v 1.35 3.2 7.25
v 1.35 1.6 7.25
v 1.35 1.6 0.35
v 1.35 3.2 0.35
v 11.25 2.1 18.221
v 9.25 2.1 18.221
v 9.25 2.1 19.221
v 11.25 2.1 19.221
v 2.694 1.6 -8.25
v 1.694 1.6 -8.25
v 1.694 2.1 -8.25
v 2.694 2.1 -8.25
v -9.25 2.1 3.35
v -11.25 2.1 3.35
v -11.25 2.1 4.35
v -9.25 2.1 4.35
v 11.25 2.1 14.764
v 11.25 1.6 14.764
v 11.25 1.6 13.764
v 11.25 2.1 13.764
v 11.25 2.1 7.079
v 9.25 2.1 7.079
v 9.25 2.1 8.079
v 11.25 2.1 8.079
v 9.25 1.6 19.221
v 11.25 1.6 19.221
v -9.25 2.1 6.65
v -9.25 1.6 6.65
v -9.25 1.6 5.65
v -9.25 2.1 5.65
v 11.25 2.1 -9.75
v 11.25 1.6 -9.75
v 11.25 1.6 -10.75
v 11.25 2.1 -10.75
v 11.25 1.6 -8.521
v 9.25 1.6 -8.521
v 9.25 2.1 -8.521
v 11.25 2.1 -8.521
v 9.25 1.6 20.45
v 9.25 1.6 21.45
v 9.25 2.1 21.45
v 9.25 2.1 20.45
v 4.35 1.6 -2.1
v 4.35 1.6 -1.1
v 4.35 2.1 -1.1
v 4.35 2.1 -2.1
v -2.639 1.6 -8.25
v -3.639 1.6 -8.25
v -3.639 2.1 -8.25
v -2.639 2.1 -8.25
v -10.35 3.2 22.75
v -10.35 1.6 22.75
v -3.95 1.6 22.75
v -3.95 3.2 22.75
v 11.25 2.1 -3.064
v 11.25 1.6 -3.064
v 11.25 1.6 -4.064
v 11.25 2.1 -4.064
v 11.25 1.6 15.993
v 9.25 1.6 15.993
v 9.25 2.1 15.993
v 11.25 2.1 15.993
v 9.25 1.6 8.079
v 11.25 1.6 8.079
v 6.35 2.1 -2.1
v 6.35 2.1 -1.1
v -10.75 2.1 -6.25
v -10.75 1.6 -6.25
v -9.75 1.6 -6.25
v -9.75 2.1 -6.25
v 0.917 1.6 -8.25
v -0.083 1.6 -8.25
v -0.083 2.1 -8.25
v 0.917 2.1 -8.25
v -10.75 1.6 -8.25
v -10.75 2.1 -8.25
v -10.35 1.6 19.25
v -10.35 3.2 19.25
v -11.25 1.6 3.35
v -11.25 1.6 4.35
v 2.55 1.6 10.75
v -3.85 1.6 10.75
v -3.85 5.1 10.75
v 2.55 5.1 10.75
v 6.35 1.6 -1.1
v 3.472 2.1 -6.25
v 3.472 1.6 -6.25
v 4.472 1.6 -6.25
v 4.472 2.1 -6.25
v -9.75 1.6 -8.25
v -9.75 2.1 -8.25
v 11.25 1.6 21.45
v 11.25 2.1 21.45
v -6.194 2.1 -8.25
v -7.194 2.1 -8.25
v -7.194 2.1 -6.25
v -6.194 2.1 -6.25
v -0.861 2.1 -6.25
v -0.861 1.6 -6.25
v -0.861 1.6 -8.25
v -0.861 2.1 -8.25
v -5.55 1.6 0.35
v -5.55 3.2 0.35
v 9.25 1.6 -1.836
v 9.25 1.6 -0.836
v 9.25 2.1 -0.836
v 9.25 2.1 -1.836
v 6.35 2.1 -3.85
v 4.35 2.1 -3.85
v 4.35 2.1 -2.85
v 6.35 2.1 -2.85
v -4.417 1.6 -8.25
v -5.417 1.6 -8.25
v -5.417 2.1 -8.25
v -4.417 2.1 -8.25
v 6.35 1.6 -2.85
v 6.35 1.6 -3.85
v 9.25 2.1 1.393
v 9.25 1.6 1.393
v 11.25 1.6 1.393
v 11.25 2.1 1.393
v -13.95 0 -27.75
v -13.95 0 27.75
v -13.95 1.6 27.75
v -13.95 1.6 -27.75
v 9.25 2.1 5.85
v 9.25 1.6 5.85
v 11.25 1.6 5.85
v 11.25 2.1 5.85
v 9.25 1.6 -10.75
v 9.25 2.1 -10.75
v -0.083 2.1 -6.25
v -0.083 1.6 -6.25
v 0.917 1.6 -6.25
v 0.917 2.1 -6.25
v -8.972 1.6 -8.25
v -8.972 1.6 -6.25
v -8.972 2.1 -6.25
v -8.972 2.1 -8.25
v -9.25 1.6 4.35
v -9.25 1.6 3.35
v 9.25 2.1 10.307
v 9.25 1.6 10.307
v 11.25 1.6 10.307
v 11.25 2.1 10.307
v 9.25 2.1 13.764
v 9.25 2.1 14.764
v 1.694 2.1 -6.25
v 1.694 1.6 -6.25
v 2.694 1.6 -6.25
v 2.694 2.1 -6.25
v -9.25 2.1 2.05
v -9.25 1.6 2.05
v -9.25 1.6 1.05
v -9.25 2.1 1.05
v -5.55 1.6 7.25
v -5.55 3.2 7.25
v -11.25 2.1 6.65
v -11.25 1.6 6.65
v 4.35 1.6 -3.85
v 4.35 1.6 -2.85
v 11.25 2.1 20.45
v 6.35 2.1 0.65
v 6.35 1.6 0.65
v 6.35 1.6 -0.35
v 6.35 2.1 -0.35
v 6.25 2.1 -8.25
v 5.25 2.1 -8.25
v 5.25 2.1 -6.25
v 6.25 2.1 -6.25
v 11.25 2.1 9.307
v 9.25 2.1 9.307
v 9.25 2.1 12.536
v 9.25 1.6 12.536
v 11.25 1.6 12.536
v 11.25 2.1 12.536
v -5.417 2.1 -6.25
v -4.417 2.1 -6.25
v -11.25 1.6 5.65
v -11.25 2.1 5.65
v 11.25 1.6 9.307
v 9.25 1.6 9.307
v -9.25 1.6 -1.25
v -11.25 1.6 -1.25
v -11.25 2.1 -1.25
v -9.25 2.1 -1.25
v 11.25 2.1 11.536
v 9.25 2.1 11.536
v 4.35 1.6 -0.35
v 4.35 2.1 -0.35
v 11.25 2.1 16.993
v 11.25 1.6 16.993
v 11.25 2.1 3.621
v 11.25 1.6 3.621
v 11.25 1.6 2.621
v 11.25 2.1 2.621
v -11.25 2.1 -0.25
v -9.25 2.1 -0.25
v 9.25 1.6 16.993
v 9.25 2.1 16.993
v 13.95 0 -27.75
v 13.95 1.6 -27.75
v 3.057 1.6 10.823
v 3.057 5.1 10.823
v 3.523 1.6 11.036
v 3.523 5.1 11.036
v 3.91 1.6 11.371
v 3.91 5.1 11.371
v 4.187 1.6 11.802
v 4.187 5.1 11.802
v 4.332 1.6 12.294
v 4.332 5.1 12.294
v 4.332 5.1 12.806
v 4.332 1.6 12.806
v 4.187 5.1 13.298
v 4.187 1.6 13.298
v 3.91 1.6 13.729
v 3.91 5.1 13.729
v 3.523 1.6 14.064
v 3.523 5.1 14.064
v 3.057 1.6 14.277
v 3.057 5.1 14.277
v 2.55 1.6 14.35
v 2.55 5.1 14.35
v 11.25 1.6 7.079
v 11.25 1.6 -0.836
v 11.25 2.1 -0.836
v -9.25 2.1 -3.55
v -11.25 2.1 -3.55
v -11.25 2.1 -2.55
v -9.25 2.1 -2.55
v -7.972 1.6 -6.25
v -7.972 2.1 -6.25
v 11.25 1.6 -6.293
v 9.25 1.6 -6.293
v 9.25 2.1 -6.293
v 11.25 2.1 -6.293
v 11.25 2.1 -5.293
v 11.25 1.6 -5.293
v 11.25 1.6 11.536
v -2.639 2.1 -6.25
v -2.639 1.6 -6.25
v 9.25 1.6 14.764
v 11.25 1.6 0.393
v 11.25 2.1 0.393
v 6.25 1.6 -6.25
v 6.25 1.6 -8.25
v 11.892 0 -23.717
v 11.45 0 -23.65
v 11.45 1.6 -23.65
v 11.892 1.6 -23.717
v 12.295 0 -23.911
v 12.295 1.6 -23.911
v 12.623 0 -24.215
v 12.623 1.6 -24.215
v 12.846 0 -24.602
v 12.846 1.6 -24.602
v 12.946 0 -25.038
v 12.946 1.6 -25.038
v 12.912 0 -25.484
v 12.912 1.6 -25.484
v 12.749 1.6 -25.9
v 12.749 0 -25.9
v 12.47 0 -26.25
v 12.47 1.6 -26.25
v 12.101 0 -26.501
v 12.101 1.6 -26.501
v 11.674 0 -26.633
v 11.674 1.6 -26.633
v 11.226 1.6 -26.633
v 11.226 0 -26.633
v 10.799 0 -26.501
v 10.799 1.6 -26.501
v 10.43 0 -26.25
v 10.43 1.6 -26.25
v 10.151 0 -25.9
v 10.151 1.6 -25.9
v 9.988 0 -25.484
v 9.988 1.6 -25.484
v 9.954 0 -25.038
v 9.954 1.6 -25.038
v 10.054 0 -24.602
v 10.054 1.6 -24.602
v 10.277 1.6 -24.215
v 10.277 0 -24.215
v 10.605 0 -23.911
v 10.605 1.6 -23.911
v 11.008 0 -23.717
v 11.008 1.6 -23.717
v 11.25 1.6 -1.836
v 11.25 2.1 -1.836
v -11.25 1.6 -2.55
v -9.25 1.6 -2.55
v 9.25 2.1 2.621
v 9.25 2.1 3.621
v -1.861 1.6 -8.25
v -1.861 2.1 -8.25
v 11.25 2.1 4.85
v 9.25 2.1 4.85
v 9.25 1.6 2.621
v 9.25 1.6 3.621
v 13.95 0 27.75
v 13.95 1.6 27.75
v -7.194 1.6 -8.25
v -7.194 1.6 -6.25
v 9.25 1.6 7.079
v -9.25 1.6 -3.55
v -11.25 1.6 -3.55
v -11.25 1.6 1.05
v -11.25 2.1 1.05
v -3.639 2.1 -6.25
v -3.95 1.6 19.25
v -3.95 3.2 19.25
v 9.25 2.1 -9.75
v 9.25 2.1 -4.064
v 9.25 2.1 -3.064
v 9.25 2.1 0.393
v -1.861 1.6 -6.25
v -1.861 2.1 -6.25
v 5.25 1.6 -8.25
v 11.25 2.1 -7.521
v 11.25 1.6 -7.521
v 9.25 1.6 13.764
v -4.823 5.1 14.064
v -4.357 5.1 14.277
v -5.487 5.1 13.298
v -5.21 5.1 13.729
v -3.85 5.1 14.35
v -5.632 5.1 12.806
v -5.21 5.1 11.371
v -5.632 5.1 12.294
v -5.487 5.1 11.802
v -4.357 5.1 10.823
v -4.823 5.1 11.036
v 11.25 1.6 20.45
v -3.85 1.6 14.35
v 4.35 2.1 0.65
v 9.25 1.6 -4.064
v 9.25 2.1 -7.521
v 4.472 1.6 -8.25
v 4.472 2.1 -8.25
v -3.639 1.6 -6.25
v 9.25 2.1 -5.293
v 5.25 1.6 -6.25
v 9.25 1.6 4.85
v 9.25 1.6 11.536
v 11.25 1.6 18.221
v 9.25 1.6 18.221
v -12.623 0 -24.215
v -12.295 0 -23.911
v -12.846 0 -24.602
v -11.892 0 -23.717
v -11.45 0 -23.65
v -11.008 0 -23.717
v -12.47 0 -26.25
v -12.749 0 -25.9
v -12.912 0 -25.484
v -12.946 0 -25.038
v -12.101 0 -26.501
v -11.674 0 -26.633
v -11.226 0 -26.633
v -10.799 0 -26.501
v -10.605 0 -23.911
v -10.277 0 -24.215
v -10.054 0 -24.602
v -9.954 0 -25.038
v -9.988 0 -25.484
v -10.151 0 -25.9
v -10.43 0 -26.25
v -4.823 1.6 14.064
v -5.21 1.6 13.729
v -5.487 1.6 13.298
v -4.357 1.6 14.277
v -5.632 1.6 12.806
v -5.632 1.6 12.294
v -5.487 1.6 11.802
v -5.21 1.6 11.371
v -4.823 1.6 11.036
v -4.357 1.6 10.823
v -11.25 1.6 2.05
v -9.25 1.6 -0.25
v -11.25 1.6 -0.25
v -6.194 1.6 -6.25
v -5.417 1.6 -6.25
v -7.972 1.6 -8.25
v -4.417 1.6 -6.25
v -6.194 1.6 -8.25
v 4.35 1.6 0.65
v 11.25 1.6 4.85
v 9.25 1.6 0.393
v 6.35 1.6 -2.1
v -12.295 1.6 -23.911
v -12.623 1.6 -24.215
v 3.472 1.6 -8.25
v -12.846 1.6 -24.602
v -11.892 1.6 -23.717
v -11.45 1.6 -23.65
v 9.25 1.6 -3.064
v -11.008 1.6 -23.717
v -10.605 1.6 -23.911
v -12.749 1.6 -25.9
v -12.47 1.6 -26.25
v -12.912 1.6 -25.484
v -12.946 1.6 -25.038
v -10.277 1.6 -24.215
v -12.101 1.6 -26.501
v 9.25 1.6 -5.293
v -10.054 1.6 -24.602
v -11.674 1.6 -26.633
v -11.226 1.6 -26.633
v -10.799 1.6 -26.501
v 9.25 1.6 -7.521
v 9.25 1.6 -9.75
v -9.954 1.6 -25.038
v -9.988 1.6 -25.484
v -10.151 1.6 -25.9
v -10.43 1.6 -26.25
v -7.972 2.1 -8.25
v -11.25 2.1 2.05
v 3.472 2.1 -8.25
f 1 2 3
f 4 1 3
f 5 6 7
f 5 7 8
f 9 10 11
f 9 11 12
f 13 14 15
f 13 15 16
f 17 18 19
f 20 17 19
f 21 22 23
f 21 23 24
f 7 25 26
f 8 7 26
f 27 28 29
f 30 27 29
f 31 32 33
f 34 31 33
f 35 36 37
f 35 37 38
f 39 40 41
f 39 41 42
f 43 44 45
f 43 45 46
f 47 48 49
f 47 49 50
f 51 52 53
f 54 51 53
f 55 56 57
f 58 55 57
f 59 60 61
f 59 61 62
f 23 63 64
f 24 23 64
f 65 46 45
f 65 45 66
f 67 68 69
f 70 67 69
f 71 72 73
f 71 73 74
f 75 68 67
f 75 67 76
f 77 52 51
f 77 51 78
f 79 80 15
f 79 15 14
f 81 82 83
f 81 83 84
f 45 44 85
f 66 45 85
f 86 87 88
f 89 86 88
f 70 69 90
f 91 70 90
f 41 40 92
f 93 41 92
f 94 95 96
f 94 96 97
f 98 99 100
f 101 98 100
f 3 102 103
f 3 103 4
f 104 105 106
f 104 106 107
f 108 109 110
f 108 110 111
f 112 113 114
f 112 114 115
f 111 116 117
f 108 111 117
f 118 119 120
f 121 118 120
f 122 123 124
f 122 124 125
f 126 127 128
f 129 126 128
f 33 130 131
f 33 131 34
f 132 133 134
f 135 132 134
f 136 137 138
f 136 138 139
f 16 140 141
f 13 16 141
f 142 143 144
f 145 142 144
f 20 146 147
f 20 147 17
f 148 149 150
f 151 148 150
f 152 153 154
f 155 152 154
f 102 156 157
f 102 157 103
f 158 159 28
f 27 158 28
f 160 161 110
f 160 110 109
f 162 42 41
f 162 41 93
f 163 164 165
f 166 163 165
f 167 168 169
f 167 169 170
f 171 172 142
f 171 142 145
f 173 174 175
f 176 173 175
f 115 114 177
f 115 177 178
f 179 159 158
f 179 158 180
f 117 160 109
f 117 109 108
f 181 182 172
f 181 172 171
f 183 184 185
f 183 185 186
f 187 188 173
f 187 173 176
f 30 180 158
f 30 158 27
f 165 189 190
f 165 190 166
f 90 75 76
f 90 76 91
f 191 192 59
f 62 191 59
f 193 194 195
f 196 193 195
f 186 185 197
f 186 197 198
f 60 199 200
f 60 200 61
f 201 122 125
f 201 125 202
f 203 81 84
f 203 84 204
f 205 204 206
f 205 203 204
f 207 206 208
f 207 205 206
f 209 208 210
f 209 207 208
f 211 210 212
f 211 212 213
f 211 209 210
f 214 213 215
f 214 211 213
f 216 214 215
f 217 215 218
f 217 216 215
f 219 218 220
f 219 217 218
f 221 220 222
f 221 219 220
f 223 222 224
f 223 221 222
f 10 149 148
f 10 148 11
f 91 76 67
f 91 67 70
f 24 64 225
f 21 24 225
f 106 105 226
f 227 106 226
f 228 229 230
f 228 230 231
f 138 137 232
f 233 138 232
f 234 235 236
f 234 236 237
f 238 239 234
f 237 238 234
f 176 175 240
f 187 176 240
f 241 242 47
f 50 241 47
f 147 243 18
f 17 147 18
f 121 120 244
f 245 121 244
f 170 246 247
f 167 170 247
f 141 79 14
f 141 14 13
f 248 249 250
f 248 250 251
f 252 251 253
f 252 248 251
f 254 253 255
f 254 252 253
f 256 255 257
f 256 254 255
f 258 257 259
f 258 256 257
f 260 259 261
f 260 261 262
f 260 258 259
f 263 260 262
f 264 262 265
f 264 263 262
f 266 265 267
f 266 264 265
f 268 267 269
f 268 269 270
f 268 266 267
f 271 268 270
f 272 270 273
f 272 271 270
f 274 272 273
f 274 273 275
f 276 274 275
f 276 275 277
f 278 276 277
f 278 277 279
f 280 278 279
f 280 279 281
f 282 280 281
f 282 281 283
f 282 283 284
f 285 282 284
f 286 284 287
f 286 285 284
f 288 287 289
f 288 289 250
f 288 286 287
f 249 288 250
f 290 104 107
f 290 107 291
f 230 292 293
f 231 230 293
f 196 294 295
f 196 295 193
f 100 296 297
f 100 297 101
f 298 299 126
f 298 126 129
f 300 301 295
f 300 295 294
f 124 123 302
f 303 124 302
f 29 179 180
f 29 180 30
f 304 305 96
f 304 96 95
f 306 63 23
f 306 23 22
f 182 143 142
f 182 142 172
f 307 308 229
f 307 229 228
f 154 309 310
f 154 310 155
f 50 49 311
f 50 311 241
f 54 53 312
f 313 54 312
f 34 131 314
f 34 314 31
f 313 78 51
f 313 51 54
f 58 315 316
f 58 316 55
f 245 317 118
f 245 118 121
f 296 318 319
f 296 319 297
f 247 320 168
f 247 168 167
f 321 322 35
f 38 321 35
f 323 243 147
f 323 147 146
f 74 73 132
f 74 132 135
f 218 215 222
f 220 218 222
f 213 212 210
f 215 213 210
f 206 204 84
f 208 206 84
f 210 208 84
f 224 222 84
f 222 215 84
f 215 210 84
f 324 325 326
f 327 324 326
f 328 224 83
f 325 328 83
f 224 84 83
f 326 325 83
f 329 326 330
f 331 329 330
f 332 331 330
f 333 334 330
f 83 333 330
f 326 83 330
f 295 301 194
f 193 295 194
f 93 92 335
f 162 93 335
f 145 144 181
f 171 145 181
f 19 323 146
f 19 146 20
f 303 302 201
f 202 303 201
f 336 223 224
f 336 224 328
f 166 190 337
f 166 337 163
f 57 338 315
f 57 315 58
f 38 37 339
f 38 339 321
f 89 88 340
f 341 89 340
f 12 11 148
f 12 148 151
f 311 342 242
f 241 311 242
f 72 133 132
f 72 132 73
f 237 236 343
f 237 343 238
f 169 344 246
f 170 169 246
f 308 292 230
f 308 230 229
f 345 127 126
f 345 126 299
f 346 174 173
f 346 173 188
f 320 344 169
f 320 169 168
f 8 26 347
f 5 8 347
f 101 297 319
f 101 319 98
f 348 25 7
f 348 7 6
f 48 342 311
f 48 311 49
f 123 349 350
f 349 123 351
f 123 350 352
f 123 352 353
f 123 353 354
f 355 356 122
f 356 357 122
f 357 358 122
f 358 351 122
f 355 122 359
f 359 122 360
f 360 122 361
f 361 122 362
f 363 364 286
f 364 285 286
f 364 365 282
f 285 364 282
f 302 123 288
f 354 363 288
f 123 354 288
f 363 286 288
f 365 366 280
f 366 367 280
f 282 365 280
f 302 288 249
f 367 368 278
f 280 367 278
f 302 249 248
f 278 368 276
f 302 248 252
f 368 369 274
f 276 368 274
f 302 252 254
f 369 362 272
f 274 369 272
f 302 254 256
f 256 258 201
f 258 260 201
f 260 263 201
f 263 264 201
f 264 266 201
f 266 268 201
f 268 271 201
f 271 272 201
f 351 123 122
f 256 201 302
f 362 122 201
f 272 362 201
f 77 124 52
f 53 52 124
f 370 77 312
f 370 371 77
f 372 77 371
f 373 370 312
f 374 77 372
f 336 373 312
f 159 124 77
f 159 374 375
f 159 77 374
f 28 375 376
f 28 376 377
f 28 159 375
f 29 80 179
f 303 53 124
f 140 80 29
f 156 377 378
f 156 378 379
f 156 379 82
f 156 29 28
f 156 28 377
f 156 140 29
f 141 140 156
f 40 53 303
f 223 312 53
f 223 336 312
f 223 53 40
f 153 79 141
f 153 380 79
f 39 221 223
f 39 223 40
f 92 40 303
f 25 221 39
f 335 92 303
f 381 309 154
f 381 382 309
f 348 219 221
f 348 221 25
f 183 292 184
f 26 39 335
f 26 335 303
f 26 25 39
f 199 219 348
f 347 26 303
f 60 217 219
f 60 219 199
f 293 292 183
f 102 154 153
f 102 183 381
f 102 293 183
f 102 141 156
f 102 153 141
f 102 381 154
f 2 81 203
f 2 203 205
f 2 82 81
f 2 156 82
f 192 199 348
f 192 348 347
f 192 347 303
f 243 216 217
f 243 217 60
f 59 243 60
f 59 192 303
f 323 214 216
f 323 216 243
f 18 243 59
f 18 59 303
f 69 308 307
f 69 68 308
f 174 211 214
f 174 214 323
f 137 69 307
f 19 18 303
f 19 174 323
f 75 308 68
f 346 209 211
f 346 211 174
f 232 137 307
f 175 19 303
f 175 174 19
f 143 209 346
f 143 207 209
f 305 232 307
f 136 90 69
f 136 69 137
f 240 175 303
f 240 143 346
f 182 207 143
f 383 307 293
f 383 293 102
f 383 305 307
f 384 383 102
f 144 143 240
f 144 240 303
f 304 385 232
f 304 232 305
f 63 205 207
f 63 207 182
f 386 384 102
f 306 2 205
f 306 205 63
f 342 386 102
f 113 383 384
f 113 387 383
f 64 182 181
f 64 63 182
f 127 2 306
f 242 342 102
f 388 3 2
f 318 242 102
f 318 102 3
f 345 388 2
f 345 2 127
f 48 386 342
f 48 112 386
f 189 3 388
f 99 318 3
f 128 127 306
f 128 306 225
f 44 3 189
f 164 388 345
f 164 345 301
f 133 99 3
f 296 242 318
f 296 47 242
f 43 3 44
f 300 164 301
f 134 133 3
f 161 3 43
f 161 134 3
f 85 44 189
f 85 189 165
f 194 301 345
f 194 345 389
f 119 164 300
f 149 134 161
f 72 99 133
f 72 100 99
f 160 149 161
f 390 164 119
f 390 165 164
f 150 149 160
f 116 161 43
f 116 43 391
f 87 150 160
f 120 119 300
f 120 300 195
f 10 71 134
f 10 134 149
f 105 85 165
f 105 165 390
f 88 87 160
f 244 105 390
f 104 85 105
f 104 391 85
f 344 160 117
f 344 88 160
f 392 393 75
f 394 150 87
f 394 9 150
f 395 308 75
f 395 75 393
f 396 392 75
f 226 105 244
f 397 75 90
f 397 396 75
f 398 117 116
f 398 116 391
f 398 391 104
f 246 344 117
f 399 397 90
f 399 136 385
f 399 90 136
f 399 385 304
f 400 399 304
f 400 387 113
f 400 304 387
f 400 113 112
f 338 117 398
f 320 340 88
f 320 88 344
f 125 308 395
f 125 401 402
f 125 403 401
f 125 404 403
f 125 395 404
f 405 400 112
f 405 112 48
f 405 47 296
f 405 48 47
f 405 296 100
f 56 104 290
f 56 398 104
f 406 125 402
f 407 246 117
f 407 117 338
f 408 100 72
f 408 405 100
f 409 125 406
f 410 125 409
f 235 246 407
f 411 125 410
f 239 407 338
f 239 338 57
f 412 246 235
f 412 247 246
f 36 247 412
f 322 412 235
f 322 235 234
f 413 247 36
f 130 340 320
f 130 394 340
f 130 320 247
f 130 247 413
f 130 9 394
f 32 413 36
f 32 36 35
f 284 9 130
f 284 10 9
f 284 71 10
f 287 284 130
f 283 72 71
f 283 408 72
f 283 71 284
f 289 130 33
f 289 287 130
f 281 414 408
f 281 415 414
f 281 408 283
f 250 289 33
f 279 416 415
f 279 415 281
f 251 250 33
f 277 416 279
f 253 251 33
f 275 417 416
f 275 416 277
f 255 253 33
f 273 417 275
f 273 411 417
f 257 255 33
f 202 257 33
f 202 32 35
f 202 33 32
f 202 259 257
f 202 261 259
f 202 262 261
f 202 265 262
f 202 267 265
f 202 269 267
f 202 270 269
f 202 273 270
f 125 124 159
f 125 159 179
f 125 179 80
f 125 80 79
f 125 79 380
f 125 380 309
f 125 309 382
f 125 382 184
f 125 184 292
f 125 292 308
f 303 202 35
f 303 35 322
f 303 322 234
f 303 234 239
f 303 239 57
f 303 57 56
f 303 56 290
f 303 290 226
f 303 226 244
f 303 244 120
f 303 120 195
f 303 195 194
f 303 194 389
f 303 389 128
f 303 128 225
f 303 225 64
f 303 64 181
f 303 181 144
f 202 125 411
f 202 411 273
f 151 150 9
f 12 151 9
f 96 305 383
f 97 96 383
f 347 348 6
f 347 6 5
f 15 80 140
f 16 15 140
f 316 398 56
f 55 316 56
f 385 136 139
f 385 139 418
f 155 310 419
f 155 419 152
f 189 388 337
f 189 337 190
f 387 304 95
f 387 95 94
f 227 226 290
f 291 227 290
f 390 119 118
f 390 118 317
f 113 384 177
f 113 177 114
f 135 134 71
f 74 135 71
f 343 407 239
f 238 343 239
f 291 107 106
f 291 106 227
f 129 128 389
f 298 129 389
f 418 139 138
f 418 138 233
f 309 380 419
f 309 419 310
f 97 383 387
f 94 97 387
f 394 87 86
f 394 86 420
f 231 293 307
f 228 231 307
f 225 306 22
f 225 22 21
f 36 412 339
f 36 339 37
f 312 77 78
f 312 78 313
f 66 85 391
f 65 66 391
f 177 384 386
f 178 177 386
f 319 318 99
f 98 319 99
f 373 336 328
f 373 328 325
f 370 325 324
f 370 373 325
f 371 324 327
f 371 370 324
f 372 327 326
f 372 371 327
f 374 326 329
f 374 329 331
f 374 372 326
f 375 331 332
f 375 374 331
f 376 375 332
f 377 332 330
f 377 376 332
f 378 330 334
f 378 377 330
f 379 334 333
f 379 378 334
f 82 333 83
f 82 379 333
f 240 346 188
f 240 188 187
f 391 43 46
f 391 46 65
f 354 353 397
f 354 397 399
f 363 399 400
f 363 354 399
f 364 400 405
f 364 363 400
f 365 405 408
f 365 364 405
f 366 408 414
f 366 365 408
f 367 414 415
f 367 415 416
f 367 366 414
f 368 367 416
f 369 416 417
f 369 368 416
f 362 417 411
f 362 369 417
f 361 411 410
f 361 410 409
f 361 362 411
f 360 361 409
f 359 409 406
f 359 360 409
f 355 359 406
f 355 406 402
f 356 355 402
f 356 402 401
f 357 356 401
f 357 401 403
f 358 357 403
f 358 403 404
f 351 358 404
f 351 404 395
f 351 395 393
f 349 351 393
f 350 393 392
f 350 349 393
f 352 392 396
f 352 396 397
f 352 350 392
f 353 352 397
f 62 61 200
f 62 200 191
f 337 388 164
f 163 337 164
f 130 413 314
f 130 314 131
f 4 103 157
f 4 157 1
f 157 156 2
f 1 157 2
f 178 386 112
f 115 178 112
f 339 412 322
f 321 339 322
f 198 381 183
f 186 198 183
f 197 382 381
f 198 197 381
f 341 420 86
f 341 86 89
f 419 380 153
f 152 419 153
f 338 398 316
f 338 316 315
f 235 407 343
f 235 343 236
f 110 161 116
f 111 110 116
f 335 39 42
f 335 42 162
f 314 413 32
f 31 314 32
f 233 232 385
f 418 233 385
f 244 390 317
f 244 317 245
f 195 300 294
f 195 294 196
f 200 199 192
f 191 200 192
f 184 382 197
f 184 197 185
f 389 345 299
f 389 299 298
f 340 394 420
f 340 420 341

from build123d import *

# Parameters (mm, degrees)
SKETCH_1_W      = 27.9
SKETCH_1_H      = 55.5
SKETCH_1_R      = 1.5
EXTRUDE_1_DEPTH = 1.6
SKETCH_2_W      = 6.9
SKETCH_2_H      = 6.9
SKETCH_2_W_2    = 6.4
SKETCH_2_H_2    = 3.5
EXTRUDE_2_DEPTH = 1.6
EXTRUDE_3_DEPTH = 3.5
SKETCH_4_W      = 2
SKETCH_4_H      = 1
SKETCH_4_W_2    = 1
SKETCH_4_H_2    = 2
EXTRUDE_4_DEPTH = 0.5


with BuildPart() as part:
    # Эскиз1 → Бобышка-Вытянуть1 (new body)
    with BuildSketch(Plane(origin=(0, 0, 0), x_dir=(1, 0, 0), z_dir=(0, 1, 0))):
        Rectangle(SKETCH_1_W, SKETCH_1_H)
        with Locations(Location((-11.45, 25.15, 0), (0, 0, 270))):
            Circle(SKETCH_1_R, mode=Mode.SUBTRACT)
        with Locations(Location((11.45, 25.15, 0), (0, 0, 270))):
            Circle(SKETCH_1_R, mode=Mode.SUBTRACT)
    extrude(amount=EXTRUDE_1_DEPTH)

    # Эскиз2 → Бобышка-Вытянуть2 (add)
    with BuildSketch(Plane(origin=(0, 1.6, 0), x_dir=(1, 0, 0), z_dir=(0, 1, 0))):
        with Locations((-2.1, -3.8)):
            Rectangle(SKETCH_2_W, SKETCH_2_H)
        with Locations((-7.15, -21)):
            Rectangle(SKETCH_2_W_2, SKETCH_2_H_2)
    extrude(amount=EXTRUDE_2_DEPTH)

    # Эскиз3 → Бобышка-Вытянуть3 (add)
    with BuildSketch(Plane(origin=(0, 1.6, 0), x_dir=(1, 0, 0), z_dir=(0, 1, 0))):
        with BuildLine():
            Line((2.55, -14.35), (-3.85, -14.35))
            ThreePointArc((-3.85, -14.35), (-5.65, -12.55), (-3.85, -10.75))
            Line((-3.85, -10.75), (2.55, -10.75))
            ThreePointArc((2.55, -10.75), (4.35, -12.55), (2.55, -14.35))
        make_face()
    extrude(amount=EXTRUDE_3_DEPTH)

    # Эскиз4 → Бобышка-Вытянуть4 (add)
    with BuildSketch(Plane(origin=(0, 1.6, 0), x_dir=(1, 0, 0), z_dir=(0, 1, 0))):
        with Locations((10.25, -20.95)):
            Rectangle(SKETCH_4_W, SKETCH_4_H)
        with Locations((10.25, -18.721428571)):
            Rectangle(SKETCH_4_W, SKETCH_4_H)
        with Locations((10.25, -16.492857143)):
            Rectangle(SKETCH_4_W, SKETCH_4_H)
        with Locations((10.25, -14.264285714)):
            Rectangle(SKETCH_4_W, SKETCH_4_H)
        with Locations((10.25, -12.035714286)):
            Rectangle(SKETCH_4_W, SKETCH_4_H)
        with Locations((10.25, -9.807142857)):
            Rectangle(SKETCH_4_W, SKETCH_4_H)
        with Locations((10.25, -7.578571429)):
            Rectangle(SKETCH_4_W, SKETCH_4_H)
        with Locations((10.25, -5.35)):
            Rectangle(SKETCH_4_W, SKETCH_4_H)
        with Locations((10.25, -3.121428571)):
            Rectangle(SKETCH_4_W, SKETCH_4_H)
        with Locations((10.25, -0.892857143)):
            Rectangle(SKETCH_4_W, SKETCH_4_H)
        with Locations((10.25, 1.335714286)):
            Rectangle(SKETCH_4_W, SKETCH_4_H)
        with Locations((10.25, 3.564285714)):
            Rectangle(SKETCH_4_W, SKETCH_4_H)
        with Locations((10.25, 5.792857143)):
            Rectangle(SKETCH_4_W, SKETCH_4_H)
        with Locations((10.25, 8.021428571)):
            Rectangle(SKETCH_4_W, SKETCH_4_H)
        with Locations((10.25, 10.25)):
            Rectangle(SKETCH_4_W, SKETCH_4_H)
        with Locations((-10.25, 7.25)):
            Rectangle(SKETCH_4_W_2, SKETCH_4_H_2)
        with Locations((-8.472222222, 7.25)):
            Rectangle(SKETCH_4_W_2, SKETCH_4_H_2)
        with Locations((-6.694444444, 7.25)):
            Rectangle(SKETCH_4_W_2, SKETCH_4_H_2)
        with Locations((-4.916666667, 7.25)):
            Rectangle(SKETCH_4_W_2, SKETCH_4_H_2)
        with Locations((-3.138888889, 7.25)):
            Rectangle(SKETCH_4_W_2, SKETCH_4_H_2)
        with Locations((-1.361111111, 7.25)):
            Rectangle(SKETCH_4_W_2, SKETCH_4_H_2)
        with Locations((0.416666667, 7.25)):
            Rectangle(SKETCH_4_W_2, SKETCH_4_H_2)
        with Locations((2.194444444, 7.25)):
            Rectangle(SKETCH_4_W_2, SKETCH_4_H_2)
        with Locations((3.972222222, 7.25)):
            Rectangle(SKETCH_4_W_2, SKETCH_4_H_2)
        with Locations((5.75, 7.25)):
            Rectangle(SKETCH_4_W_2, SKETCH_4_H_2)
        with Locations((5.35, 3.35)):
            Rectangle(SKETCH_4_W, SKETCH_4_H)
        with Locations((5.35, 1.6)):
            Rectangle(SKETCH_4_W, SKETCH_4_H)
        with Locations((5.35, -0.15)):
            Rectangle(SKETCH_4_W, SKETCH_4_H)
        with Locations((-10.25, 0.75)):
            Rectangle(SKETCH_4_W, SKETCH_4_H)
        with Locations((-10.25, 3.05)):
            Rectangle(SKETCH_4_W, SKETCH_4_H)
        with Locations((-10.25, -1.55)):
            Rectangle(SKETCH_4_W, SKETCH_4_H)
        with Locations((-10.25, -3.85)):
            Rectangle(SKETCH_4_W, SKETCH_4_H)
        with Locations((-10.25, -6.15)):
            Rectangle(SKETCH_4_W, SKETCH_4_H)
    extrude(amount=EXTRUDE_4_DEPTH)


solid = part.part
